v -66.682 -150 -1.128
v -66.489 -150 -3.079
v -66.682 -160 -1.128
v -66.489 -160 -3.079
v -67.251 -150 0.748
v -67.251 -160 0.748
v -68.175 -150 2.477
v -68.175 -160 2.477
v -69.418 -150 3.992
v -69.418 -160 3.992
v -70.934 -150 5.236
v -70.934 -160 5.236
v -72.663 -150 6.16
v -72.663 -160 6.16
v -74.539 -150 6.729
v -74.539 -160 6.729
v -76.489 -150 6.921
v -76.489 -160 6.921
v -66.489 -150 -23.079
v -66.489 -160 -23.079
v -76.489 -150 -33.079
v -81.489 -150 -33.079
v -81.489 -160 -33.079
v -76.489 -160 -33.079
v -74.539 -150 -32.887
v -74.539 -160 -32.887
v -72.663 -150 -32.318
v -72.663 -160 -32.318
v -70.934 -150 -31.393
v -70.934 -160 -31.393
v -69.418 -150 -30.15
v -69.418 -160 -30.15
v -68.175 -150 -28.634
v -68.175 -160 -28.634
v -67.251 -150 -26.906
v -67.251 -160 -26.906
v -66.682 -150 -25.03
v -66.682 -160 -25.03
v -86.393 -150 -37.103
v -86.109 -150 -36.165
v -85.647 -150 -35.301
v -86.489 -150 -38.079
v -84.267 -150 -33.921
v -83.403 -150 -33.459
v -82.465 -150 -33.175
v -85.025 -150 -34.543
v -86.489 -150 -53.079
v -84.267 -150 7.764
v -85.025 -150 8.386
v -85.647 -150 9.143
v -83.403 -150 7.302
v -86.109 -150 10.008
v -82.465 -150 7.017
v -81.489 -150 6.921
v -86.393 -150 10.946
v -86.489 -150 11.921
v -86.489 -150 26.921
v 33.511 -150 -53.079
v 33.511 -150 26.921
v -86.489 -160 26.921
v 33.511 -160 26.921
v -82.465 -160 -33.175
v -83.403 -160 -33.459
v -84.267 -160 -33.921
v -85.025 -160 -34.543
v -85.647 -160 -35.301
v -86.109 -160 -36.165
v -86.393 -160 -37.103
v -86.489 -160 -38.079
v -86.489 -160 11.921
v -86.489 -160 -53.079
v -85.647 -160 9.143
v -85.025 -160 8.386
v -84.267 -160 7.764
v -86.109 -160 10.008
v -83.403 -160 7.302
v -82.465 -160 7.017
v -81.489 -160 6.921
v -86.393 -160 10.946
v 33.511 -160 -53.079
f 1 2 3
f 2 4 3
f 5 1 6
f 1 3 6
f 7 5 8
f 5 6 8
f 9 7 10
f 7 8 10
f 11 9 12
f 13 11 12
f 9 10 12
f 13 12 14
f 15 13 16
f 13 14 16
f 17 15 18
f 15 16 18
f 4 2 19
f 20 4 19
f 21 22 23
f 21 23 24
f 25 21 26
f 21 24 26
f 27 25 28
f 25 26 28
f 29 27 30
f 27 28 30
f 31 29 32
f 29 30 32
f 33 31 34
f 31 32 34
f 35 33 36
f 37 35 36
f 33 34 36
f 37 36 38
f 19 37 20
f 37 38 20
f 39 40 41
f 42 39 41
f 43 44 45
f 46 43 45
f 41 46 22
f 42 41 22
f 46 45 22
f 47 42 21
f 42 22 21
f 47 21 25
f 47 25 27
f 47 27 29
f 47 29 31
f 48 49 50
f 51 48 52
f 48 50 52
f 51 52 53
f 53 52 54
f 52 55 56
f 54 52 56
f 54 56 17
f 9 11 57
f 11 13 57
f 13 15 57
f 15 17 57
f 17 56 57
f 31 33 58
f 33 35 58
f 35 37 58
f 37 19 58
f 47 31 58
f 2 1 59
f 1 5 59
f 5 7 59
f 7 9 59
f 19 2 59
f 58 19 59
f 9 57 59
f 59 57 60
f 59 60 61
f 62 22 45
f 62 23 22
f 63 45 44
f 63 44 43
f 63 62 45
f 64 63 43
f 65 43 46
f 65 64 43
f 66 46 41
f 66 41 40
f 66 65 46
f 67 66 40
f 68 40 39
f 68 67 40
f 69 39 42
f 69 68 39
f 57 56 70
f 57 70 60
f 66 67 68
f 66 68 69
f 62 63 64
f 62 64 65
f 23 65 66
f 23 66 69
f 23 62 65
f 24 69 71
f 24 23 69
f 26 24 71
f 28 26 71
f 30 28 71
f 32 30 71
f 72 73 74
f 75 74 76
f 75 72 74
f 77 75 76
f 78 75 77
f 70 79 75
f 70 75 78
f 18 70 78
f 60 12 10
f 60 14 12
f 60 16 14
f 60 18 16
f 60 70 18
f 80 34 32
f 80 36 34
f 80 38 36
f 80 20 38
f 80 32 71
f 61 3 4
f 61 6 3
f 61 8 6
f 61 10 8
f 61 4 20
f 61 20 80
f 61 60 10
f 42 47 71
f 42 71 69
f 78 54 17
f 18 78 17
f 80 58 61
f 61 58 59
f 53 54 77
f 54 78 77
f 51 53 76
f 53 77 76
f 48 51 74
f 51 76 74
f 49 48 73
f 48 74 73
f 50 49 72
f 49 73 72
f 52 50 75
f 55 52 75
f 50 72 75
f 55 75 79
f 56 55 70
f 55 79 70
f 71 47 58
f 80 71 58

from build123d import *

# Parameters (mm, degrees)
SKETCH1_W           = 120
SKETCH1_H           = 80
BOSS_EXTRUDE1_DEPTH = 10
SKETCH2_W           = 20
SKETCH2_H           = 40
CUT_EXTRUDE1_DEPTH  = 11
FILLET1_R           = 10
FILLET2_R           = 5


with BuildPart() as part:
    # Sketch1 → Boss-Extrude1 (new body)
    with BuildSketch(Plane.XZ.offset(150)):
        with Locations((-26.489460092, -13.07873573)):
            Rectangle(SKETCH1_W, SKETCH1_H)
    extrude(amount=BOSS_EXTRUDE1_DEPTH)

    # Sketch2 → Cut-Extrude1 (cut, through all)
    with BuildSketch(Plane(origin=(0, -150, 0), x_dir=(1, 0, 0), z_dir=(0, 1, 0))):
        with Locations((-76.489460092, 13.07873573)):
            Rectangle(SKETCH2_W, SKETCH2_H)
    extrude(amount=-CUT_EXTRUDE1_DEPTH, mode=Mode.SUBTRACT)

    # Fillet1
    fillet1_edges = [part.edges().sort_by_distance(p)[0] for p in [
        (-66.489460092, -155, -33.07873573),
        (-66.489460092, -155, 6.92126427),
    ]]
    fillet(fillet1_edges, radius=FILLET1_R)

    # Fillet2
    fillet2_edges = [part.edges().sort_by_distance(p)[0] for p in [
        (-86.489460092, -155, 6.92126427),
        (-86.489460092, -155, -33.07873573),
    ]]
    fillet(fillet2_edges, radius=FILLET2_R)


solid = part.part
